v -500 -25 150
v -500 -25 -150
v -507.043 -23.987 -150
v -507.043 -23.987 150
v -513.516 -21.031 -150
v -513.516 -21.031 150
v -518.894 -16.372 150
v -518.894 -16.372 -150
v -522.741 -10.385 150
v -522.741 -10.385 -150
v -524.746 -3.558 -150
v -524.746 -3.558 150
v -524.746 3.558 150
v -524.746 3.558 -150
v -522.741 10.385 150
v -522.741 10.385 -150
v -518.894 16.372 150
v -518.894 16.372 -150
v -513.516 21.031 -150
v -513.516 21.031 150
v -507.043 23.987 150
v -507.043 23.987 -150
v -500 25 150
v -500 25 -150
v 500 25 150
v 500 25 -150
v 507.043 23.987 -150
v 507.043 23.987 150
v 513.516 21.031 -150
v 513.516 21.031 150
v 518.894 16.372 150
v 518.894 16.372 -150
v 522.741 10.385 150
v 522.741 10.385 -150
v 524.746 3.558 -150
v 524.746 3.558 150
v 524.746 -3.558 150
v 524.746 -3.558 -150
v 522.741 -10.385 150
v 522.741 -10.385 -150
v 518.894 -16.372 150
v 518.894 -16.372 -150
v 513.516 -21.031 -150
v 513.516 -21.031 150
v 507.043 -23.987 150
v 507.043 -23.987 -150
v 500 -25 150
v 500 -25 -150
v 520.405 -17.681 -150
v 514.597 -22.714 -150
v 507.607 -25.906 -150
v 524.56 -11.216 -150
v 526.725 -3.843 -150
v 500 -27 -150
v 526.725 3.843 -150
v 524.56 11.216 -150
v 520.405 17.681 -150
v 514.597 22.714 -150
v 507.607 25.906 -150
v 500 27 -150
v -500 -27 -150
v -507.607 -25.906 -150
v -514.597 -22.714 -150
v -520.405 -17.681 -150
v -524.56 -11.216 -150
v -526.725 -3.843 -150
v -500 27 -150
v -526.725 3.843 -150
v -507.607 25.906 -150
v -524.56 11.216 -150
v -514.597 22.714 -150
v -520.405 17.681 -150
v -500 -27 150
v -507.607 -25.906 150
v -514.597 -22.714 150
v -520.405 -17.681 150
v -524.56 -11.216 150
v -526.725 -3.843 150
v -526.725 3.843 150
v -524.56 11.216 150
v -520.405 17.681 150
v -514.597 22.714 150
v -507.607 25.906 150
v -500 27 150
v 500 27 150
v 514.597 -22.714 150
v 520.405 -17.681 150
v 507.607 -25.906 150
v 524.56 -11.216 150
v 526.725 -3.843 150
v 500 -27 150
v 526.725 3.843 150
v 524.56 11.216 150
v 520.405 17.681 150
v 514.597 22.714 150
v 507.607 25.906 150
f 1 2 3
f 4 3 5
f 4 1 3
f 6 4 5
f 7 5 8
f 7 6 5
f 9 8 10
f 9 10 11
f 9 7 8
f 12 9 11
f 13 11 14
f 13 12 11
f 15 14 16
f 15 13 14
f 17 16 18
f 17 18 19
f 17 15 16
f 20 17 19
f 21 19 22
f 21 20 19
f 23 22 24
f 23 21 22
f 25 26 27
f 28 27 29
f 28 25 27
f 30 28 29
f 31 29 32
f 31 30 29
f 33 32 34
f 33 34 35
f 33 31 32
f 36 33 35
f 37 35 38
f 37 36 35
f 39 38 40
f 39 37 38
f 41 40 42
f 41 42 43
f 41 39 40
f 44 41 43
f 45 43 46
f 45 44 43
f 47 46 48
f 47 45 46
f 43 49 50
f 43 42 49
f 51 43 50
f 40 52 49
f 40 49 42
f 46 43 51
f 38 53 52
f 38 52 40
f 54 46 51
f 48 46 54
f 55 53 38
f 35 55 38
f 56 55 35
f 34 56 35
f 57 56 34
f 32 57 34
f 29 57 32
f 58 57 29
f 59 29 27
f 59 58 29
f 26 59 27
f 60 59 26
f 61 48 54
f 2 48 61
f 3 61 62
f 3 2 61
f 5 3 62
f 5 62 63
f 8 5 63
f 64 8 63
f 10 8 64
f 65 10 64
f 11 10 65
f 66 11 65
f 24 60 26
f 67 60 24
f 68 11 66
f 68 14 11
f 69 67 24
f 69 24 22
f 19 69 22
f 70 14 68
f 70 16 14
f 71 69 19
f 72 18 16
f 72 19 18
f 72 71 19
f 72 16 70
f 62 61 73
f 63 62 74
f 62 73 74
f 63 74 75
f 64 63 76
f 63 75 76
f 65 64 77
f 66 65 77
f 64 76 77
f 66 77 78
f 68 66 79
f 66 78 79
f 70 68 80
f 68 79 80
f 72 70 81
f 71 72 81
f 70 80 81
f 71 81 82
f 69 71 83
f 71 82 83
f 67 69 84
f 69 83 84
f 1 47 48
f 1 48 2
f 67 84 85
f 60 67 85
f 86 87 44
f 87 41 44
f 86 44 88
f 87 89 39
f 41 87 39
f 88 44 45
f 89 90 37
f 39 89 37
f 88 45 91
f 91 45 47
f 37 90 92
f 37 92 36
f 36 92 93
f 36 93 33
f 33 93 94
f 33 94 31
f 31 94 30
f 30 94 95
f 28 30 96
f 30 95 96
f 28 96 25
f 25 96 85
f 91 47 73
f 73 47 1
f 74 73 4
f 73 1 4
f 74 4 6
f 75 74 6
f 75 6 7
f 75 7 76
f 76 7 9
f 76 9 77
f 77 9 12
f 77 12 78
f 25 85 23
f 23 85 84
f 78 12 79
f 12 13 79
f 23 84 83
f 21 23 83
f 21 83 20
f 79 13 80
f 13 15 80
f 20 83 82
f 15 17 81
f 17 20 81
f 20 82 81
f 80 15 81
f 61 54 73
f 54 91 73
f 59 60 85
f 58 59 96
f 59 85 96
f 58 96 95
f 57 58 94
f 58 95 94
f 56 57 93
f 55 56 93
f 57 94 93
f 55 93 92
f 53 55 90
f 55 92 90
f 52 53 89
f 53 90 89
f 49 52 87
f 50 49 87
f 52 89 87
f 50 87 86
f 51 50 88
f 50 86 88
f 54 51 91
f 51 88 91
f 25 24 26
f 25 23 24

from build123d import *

# Parameters (mm, degrees)
EXTRUDE1_DEPTH      = 150
EXTRUDE1_DEPTH_BACK = 150


with BuildPart() as part:
    # Sketch1 → Extrude1 (new body, two sides)
    with BuildSketch(Plane.XY) as extrude1_sk:
        with BuildLine():
            Line((-500, 27), (500, 27))
            ThreePointArc((500, 27), (527, 0), (500, -27))
            Line((500, -27), (-500, -27))
            ThreePointArc((-500, -27), (-527, 0), (-500, 27))
        make_face()
        with BuildLine():
            Line((-500, 25), (500, 25))
            ThreePointArc((500, 25), (525, 0), (500, -25))
            Line((500, -25), (-500, -25))
            ThreePointArc((-500, -25), (-525, 0), (-500, 25))
        make_face(mode=Mode.SUBTRACT)
    extrude(amount=EXTRUDE1_DEPTH)
    extrude(extrude1_sk.sketch, amount=-EXTRUDE1_DEPTH_BACK)


solid = part.part
